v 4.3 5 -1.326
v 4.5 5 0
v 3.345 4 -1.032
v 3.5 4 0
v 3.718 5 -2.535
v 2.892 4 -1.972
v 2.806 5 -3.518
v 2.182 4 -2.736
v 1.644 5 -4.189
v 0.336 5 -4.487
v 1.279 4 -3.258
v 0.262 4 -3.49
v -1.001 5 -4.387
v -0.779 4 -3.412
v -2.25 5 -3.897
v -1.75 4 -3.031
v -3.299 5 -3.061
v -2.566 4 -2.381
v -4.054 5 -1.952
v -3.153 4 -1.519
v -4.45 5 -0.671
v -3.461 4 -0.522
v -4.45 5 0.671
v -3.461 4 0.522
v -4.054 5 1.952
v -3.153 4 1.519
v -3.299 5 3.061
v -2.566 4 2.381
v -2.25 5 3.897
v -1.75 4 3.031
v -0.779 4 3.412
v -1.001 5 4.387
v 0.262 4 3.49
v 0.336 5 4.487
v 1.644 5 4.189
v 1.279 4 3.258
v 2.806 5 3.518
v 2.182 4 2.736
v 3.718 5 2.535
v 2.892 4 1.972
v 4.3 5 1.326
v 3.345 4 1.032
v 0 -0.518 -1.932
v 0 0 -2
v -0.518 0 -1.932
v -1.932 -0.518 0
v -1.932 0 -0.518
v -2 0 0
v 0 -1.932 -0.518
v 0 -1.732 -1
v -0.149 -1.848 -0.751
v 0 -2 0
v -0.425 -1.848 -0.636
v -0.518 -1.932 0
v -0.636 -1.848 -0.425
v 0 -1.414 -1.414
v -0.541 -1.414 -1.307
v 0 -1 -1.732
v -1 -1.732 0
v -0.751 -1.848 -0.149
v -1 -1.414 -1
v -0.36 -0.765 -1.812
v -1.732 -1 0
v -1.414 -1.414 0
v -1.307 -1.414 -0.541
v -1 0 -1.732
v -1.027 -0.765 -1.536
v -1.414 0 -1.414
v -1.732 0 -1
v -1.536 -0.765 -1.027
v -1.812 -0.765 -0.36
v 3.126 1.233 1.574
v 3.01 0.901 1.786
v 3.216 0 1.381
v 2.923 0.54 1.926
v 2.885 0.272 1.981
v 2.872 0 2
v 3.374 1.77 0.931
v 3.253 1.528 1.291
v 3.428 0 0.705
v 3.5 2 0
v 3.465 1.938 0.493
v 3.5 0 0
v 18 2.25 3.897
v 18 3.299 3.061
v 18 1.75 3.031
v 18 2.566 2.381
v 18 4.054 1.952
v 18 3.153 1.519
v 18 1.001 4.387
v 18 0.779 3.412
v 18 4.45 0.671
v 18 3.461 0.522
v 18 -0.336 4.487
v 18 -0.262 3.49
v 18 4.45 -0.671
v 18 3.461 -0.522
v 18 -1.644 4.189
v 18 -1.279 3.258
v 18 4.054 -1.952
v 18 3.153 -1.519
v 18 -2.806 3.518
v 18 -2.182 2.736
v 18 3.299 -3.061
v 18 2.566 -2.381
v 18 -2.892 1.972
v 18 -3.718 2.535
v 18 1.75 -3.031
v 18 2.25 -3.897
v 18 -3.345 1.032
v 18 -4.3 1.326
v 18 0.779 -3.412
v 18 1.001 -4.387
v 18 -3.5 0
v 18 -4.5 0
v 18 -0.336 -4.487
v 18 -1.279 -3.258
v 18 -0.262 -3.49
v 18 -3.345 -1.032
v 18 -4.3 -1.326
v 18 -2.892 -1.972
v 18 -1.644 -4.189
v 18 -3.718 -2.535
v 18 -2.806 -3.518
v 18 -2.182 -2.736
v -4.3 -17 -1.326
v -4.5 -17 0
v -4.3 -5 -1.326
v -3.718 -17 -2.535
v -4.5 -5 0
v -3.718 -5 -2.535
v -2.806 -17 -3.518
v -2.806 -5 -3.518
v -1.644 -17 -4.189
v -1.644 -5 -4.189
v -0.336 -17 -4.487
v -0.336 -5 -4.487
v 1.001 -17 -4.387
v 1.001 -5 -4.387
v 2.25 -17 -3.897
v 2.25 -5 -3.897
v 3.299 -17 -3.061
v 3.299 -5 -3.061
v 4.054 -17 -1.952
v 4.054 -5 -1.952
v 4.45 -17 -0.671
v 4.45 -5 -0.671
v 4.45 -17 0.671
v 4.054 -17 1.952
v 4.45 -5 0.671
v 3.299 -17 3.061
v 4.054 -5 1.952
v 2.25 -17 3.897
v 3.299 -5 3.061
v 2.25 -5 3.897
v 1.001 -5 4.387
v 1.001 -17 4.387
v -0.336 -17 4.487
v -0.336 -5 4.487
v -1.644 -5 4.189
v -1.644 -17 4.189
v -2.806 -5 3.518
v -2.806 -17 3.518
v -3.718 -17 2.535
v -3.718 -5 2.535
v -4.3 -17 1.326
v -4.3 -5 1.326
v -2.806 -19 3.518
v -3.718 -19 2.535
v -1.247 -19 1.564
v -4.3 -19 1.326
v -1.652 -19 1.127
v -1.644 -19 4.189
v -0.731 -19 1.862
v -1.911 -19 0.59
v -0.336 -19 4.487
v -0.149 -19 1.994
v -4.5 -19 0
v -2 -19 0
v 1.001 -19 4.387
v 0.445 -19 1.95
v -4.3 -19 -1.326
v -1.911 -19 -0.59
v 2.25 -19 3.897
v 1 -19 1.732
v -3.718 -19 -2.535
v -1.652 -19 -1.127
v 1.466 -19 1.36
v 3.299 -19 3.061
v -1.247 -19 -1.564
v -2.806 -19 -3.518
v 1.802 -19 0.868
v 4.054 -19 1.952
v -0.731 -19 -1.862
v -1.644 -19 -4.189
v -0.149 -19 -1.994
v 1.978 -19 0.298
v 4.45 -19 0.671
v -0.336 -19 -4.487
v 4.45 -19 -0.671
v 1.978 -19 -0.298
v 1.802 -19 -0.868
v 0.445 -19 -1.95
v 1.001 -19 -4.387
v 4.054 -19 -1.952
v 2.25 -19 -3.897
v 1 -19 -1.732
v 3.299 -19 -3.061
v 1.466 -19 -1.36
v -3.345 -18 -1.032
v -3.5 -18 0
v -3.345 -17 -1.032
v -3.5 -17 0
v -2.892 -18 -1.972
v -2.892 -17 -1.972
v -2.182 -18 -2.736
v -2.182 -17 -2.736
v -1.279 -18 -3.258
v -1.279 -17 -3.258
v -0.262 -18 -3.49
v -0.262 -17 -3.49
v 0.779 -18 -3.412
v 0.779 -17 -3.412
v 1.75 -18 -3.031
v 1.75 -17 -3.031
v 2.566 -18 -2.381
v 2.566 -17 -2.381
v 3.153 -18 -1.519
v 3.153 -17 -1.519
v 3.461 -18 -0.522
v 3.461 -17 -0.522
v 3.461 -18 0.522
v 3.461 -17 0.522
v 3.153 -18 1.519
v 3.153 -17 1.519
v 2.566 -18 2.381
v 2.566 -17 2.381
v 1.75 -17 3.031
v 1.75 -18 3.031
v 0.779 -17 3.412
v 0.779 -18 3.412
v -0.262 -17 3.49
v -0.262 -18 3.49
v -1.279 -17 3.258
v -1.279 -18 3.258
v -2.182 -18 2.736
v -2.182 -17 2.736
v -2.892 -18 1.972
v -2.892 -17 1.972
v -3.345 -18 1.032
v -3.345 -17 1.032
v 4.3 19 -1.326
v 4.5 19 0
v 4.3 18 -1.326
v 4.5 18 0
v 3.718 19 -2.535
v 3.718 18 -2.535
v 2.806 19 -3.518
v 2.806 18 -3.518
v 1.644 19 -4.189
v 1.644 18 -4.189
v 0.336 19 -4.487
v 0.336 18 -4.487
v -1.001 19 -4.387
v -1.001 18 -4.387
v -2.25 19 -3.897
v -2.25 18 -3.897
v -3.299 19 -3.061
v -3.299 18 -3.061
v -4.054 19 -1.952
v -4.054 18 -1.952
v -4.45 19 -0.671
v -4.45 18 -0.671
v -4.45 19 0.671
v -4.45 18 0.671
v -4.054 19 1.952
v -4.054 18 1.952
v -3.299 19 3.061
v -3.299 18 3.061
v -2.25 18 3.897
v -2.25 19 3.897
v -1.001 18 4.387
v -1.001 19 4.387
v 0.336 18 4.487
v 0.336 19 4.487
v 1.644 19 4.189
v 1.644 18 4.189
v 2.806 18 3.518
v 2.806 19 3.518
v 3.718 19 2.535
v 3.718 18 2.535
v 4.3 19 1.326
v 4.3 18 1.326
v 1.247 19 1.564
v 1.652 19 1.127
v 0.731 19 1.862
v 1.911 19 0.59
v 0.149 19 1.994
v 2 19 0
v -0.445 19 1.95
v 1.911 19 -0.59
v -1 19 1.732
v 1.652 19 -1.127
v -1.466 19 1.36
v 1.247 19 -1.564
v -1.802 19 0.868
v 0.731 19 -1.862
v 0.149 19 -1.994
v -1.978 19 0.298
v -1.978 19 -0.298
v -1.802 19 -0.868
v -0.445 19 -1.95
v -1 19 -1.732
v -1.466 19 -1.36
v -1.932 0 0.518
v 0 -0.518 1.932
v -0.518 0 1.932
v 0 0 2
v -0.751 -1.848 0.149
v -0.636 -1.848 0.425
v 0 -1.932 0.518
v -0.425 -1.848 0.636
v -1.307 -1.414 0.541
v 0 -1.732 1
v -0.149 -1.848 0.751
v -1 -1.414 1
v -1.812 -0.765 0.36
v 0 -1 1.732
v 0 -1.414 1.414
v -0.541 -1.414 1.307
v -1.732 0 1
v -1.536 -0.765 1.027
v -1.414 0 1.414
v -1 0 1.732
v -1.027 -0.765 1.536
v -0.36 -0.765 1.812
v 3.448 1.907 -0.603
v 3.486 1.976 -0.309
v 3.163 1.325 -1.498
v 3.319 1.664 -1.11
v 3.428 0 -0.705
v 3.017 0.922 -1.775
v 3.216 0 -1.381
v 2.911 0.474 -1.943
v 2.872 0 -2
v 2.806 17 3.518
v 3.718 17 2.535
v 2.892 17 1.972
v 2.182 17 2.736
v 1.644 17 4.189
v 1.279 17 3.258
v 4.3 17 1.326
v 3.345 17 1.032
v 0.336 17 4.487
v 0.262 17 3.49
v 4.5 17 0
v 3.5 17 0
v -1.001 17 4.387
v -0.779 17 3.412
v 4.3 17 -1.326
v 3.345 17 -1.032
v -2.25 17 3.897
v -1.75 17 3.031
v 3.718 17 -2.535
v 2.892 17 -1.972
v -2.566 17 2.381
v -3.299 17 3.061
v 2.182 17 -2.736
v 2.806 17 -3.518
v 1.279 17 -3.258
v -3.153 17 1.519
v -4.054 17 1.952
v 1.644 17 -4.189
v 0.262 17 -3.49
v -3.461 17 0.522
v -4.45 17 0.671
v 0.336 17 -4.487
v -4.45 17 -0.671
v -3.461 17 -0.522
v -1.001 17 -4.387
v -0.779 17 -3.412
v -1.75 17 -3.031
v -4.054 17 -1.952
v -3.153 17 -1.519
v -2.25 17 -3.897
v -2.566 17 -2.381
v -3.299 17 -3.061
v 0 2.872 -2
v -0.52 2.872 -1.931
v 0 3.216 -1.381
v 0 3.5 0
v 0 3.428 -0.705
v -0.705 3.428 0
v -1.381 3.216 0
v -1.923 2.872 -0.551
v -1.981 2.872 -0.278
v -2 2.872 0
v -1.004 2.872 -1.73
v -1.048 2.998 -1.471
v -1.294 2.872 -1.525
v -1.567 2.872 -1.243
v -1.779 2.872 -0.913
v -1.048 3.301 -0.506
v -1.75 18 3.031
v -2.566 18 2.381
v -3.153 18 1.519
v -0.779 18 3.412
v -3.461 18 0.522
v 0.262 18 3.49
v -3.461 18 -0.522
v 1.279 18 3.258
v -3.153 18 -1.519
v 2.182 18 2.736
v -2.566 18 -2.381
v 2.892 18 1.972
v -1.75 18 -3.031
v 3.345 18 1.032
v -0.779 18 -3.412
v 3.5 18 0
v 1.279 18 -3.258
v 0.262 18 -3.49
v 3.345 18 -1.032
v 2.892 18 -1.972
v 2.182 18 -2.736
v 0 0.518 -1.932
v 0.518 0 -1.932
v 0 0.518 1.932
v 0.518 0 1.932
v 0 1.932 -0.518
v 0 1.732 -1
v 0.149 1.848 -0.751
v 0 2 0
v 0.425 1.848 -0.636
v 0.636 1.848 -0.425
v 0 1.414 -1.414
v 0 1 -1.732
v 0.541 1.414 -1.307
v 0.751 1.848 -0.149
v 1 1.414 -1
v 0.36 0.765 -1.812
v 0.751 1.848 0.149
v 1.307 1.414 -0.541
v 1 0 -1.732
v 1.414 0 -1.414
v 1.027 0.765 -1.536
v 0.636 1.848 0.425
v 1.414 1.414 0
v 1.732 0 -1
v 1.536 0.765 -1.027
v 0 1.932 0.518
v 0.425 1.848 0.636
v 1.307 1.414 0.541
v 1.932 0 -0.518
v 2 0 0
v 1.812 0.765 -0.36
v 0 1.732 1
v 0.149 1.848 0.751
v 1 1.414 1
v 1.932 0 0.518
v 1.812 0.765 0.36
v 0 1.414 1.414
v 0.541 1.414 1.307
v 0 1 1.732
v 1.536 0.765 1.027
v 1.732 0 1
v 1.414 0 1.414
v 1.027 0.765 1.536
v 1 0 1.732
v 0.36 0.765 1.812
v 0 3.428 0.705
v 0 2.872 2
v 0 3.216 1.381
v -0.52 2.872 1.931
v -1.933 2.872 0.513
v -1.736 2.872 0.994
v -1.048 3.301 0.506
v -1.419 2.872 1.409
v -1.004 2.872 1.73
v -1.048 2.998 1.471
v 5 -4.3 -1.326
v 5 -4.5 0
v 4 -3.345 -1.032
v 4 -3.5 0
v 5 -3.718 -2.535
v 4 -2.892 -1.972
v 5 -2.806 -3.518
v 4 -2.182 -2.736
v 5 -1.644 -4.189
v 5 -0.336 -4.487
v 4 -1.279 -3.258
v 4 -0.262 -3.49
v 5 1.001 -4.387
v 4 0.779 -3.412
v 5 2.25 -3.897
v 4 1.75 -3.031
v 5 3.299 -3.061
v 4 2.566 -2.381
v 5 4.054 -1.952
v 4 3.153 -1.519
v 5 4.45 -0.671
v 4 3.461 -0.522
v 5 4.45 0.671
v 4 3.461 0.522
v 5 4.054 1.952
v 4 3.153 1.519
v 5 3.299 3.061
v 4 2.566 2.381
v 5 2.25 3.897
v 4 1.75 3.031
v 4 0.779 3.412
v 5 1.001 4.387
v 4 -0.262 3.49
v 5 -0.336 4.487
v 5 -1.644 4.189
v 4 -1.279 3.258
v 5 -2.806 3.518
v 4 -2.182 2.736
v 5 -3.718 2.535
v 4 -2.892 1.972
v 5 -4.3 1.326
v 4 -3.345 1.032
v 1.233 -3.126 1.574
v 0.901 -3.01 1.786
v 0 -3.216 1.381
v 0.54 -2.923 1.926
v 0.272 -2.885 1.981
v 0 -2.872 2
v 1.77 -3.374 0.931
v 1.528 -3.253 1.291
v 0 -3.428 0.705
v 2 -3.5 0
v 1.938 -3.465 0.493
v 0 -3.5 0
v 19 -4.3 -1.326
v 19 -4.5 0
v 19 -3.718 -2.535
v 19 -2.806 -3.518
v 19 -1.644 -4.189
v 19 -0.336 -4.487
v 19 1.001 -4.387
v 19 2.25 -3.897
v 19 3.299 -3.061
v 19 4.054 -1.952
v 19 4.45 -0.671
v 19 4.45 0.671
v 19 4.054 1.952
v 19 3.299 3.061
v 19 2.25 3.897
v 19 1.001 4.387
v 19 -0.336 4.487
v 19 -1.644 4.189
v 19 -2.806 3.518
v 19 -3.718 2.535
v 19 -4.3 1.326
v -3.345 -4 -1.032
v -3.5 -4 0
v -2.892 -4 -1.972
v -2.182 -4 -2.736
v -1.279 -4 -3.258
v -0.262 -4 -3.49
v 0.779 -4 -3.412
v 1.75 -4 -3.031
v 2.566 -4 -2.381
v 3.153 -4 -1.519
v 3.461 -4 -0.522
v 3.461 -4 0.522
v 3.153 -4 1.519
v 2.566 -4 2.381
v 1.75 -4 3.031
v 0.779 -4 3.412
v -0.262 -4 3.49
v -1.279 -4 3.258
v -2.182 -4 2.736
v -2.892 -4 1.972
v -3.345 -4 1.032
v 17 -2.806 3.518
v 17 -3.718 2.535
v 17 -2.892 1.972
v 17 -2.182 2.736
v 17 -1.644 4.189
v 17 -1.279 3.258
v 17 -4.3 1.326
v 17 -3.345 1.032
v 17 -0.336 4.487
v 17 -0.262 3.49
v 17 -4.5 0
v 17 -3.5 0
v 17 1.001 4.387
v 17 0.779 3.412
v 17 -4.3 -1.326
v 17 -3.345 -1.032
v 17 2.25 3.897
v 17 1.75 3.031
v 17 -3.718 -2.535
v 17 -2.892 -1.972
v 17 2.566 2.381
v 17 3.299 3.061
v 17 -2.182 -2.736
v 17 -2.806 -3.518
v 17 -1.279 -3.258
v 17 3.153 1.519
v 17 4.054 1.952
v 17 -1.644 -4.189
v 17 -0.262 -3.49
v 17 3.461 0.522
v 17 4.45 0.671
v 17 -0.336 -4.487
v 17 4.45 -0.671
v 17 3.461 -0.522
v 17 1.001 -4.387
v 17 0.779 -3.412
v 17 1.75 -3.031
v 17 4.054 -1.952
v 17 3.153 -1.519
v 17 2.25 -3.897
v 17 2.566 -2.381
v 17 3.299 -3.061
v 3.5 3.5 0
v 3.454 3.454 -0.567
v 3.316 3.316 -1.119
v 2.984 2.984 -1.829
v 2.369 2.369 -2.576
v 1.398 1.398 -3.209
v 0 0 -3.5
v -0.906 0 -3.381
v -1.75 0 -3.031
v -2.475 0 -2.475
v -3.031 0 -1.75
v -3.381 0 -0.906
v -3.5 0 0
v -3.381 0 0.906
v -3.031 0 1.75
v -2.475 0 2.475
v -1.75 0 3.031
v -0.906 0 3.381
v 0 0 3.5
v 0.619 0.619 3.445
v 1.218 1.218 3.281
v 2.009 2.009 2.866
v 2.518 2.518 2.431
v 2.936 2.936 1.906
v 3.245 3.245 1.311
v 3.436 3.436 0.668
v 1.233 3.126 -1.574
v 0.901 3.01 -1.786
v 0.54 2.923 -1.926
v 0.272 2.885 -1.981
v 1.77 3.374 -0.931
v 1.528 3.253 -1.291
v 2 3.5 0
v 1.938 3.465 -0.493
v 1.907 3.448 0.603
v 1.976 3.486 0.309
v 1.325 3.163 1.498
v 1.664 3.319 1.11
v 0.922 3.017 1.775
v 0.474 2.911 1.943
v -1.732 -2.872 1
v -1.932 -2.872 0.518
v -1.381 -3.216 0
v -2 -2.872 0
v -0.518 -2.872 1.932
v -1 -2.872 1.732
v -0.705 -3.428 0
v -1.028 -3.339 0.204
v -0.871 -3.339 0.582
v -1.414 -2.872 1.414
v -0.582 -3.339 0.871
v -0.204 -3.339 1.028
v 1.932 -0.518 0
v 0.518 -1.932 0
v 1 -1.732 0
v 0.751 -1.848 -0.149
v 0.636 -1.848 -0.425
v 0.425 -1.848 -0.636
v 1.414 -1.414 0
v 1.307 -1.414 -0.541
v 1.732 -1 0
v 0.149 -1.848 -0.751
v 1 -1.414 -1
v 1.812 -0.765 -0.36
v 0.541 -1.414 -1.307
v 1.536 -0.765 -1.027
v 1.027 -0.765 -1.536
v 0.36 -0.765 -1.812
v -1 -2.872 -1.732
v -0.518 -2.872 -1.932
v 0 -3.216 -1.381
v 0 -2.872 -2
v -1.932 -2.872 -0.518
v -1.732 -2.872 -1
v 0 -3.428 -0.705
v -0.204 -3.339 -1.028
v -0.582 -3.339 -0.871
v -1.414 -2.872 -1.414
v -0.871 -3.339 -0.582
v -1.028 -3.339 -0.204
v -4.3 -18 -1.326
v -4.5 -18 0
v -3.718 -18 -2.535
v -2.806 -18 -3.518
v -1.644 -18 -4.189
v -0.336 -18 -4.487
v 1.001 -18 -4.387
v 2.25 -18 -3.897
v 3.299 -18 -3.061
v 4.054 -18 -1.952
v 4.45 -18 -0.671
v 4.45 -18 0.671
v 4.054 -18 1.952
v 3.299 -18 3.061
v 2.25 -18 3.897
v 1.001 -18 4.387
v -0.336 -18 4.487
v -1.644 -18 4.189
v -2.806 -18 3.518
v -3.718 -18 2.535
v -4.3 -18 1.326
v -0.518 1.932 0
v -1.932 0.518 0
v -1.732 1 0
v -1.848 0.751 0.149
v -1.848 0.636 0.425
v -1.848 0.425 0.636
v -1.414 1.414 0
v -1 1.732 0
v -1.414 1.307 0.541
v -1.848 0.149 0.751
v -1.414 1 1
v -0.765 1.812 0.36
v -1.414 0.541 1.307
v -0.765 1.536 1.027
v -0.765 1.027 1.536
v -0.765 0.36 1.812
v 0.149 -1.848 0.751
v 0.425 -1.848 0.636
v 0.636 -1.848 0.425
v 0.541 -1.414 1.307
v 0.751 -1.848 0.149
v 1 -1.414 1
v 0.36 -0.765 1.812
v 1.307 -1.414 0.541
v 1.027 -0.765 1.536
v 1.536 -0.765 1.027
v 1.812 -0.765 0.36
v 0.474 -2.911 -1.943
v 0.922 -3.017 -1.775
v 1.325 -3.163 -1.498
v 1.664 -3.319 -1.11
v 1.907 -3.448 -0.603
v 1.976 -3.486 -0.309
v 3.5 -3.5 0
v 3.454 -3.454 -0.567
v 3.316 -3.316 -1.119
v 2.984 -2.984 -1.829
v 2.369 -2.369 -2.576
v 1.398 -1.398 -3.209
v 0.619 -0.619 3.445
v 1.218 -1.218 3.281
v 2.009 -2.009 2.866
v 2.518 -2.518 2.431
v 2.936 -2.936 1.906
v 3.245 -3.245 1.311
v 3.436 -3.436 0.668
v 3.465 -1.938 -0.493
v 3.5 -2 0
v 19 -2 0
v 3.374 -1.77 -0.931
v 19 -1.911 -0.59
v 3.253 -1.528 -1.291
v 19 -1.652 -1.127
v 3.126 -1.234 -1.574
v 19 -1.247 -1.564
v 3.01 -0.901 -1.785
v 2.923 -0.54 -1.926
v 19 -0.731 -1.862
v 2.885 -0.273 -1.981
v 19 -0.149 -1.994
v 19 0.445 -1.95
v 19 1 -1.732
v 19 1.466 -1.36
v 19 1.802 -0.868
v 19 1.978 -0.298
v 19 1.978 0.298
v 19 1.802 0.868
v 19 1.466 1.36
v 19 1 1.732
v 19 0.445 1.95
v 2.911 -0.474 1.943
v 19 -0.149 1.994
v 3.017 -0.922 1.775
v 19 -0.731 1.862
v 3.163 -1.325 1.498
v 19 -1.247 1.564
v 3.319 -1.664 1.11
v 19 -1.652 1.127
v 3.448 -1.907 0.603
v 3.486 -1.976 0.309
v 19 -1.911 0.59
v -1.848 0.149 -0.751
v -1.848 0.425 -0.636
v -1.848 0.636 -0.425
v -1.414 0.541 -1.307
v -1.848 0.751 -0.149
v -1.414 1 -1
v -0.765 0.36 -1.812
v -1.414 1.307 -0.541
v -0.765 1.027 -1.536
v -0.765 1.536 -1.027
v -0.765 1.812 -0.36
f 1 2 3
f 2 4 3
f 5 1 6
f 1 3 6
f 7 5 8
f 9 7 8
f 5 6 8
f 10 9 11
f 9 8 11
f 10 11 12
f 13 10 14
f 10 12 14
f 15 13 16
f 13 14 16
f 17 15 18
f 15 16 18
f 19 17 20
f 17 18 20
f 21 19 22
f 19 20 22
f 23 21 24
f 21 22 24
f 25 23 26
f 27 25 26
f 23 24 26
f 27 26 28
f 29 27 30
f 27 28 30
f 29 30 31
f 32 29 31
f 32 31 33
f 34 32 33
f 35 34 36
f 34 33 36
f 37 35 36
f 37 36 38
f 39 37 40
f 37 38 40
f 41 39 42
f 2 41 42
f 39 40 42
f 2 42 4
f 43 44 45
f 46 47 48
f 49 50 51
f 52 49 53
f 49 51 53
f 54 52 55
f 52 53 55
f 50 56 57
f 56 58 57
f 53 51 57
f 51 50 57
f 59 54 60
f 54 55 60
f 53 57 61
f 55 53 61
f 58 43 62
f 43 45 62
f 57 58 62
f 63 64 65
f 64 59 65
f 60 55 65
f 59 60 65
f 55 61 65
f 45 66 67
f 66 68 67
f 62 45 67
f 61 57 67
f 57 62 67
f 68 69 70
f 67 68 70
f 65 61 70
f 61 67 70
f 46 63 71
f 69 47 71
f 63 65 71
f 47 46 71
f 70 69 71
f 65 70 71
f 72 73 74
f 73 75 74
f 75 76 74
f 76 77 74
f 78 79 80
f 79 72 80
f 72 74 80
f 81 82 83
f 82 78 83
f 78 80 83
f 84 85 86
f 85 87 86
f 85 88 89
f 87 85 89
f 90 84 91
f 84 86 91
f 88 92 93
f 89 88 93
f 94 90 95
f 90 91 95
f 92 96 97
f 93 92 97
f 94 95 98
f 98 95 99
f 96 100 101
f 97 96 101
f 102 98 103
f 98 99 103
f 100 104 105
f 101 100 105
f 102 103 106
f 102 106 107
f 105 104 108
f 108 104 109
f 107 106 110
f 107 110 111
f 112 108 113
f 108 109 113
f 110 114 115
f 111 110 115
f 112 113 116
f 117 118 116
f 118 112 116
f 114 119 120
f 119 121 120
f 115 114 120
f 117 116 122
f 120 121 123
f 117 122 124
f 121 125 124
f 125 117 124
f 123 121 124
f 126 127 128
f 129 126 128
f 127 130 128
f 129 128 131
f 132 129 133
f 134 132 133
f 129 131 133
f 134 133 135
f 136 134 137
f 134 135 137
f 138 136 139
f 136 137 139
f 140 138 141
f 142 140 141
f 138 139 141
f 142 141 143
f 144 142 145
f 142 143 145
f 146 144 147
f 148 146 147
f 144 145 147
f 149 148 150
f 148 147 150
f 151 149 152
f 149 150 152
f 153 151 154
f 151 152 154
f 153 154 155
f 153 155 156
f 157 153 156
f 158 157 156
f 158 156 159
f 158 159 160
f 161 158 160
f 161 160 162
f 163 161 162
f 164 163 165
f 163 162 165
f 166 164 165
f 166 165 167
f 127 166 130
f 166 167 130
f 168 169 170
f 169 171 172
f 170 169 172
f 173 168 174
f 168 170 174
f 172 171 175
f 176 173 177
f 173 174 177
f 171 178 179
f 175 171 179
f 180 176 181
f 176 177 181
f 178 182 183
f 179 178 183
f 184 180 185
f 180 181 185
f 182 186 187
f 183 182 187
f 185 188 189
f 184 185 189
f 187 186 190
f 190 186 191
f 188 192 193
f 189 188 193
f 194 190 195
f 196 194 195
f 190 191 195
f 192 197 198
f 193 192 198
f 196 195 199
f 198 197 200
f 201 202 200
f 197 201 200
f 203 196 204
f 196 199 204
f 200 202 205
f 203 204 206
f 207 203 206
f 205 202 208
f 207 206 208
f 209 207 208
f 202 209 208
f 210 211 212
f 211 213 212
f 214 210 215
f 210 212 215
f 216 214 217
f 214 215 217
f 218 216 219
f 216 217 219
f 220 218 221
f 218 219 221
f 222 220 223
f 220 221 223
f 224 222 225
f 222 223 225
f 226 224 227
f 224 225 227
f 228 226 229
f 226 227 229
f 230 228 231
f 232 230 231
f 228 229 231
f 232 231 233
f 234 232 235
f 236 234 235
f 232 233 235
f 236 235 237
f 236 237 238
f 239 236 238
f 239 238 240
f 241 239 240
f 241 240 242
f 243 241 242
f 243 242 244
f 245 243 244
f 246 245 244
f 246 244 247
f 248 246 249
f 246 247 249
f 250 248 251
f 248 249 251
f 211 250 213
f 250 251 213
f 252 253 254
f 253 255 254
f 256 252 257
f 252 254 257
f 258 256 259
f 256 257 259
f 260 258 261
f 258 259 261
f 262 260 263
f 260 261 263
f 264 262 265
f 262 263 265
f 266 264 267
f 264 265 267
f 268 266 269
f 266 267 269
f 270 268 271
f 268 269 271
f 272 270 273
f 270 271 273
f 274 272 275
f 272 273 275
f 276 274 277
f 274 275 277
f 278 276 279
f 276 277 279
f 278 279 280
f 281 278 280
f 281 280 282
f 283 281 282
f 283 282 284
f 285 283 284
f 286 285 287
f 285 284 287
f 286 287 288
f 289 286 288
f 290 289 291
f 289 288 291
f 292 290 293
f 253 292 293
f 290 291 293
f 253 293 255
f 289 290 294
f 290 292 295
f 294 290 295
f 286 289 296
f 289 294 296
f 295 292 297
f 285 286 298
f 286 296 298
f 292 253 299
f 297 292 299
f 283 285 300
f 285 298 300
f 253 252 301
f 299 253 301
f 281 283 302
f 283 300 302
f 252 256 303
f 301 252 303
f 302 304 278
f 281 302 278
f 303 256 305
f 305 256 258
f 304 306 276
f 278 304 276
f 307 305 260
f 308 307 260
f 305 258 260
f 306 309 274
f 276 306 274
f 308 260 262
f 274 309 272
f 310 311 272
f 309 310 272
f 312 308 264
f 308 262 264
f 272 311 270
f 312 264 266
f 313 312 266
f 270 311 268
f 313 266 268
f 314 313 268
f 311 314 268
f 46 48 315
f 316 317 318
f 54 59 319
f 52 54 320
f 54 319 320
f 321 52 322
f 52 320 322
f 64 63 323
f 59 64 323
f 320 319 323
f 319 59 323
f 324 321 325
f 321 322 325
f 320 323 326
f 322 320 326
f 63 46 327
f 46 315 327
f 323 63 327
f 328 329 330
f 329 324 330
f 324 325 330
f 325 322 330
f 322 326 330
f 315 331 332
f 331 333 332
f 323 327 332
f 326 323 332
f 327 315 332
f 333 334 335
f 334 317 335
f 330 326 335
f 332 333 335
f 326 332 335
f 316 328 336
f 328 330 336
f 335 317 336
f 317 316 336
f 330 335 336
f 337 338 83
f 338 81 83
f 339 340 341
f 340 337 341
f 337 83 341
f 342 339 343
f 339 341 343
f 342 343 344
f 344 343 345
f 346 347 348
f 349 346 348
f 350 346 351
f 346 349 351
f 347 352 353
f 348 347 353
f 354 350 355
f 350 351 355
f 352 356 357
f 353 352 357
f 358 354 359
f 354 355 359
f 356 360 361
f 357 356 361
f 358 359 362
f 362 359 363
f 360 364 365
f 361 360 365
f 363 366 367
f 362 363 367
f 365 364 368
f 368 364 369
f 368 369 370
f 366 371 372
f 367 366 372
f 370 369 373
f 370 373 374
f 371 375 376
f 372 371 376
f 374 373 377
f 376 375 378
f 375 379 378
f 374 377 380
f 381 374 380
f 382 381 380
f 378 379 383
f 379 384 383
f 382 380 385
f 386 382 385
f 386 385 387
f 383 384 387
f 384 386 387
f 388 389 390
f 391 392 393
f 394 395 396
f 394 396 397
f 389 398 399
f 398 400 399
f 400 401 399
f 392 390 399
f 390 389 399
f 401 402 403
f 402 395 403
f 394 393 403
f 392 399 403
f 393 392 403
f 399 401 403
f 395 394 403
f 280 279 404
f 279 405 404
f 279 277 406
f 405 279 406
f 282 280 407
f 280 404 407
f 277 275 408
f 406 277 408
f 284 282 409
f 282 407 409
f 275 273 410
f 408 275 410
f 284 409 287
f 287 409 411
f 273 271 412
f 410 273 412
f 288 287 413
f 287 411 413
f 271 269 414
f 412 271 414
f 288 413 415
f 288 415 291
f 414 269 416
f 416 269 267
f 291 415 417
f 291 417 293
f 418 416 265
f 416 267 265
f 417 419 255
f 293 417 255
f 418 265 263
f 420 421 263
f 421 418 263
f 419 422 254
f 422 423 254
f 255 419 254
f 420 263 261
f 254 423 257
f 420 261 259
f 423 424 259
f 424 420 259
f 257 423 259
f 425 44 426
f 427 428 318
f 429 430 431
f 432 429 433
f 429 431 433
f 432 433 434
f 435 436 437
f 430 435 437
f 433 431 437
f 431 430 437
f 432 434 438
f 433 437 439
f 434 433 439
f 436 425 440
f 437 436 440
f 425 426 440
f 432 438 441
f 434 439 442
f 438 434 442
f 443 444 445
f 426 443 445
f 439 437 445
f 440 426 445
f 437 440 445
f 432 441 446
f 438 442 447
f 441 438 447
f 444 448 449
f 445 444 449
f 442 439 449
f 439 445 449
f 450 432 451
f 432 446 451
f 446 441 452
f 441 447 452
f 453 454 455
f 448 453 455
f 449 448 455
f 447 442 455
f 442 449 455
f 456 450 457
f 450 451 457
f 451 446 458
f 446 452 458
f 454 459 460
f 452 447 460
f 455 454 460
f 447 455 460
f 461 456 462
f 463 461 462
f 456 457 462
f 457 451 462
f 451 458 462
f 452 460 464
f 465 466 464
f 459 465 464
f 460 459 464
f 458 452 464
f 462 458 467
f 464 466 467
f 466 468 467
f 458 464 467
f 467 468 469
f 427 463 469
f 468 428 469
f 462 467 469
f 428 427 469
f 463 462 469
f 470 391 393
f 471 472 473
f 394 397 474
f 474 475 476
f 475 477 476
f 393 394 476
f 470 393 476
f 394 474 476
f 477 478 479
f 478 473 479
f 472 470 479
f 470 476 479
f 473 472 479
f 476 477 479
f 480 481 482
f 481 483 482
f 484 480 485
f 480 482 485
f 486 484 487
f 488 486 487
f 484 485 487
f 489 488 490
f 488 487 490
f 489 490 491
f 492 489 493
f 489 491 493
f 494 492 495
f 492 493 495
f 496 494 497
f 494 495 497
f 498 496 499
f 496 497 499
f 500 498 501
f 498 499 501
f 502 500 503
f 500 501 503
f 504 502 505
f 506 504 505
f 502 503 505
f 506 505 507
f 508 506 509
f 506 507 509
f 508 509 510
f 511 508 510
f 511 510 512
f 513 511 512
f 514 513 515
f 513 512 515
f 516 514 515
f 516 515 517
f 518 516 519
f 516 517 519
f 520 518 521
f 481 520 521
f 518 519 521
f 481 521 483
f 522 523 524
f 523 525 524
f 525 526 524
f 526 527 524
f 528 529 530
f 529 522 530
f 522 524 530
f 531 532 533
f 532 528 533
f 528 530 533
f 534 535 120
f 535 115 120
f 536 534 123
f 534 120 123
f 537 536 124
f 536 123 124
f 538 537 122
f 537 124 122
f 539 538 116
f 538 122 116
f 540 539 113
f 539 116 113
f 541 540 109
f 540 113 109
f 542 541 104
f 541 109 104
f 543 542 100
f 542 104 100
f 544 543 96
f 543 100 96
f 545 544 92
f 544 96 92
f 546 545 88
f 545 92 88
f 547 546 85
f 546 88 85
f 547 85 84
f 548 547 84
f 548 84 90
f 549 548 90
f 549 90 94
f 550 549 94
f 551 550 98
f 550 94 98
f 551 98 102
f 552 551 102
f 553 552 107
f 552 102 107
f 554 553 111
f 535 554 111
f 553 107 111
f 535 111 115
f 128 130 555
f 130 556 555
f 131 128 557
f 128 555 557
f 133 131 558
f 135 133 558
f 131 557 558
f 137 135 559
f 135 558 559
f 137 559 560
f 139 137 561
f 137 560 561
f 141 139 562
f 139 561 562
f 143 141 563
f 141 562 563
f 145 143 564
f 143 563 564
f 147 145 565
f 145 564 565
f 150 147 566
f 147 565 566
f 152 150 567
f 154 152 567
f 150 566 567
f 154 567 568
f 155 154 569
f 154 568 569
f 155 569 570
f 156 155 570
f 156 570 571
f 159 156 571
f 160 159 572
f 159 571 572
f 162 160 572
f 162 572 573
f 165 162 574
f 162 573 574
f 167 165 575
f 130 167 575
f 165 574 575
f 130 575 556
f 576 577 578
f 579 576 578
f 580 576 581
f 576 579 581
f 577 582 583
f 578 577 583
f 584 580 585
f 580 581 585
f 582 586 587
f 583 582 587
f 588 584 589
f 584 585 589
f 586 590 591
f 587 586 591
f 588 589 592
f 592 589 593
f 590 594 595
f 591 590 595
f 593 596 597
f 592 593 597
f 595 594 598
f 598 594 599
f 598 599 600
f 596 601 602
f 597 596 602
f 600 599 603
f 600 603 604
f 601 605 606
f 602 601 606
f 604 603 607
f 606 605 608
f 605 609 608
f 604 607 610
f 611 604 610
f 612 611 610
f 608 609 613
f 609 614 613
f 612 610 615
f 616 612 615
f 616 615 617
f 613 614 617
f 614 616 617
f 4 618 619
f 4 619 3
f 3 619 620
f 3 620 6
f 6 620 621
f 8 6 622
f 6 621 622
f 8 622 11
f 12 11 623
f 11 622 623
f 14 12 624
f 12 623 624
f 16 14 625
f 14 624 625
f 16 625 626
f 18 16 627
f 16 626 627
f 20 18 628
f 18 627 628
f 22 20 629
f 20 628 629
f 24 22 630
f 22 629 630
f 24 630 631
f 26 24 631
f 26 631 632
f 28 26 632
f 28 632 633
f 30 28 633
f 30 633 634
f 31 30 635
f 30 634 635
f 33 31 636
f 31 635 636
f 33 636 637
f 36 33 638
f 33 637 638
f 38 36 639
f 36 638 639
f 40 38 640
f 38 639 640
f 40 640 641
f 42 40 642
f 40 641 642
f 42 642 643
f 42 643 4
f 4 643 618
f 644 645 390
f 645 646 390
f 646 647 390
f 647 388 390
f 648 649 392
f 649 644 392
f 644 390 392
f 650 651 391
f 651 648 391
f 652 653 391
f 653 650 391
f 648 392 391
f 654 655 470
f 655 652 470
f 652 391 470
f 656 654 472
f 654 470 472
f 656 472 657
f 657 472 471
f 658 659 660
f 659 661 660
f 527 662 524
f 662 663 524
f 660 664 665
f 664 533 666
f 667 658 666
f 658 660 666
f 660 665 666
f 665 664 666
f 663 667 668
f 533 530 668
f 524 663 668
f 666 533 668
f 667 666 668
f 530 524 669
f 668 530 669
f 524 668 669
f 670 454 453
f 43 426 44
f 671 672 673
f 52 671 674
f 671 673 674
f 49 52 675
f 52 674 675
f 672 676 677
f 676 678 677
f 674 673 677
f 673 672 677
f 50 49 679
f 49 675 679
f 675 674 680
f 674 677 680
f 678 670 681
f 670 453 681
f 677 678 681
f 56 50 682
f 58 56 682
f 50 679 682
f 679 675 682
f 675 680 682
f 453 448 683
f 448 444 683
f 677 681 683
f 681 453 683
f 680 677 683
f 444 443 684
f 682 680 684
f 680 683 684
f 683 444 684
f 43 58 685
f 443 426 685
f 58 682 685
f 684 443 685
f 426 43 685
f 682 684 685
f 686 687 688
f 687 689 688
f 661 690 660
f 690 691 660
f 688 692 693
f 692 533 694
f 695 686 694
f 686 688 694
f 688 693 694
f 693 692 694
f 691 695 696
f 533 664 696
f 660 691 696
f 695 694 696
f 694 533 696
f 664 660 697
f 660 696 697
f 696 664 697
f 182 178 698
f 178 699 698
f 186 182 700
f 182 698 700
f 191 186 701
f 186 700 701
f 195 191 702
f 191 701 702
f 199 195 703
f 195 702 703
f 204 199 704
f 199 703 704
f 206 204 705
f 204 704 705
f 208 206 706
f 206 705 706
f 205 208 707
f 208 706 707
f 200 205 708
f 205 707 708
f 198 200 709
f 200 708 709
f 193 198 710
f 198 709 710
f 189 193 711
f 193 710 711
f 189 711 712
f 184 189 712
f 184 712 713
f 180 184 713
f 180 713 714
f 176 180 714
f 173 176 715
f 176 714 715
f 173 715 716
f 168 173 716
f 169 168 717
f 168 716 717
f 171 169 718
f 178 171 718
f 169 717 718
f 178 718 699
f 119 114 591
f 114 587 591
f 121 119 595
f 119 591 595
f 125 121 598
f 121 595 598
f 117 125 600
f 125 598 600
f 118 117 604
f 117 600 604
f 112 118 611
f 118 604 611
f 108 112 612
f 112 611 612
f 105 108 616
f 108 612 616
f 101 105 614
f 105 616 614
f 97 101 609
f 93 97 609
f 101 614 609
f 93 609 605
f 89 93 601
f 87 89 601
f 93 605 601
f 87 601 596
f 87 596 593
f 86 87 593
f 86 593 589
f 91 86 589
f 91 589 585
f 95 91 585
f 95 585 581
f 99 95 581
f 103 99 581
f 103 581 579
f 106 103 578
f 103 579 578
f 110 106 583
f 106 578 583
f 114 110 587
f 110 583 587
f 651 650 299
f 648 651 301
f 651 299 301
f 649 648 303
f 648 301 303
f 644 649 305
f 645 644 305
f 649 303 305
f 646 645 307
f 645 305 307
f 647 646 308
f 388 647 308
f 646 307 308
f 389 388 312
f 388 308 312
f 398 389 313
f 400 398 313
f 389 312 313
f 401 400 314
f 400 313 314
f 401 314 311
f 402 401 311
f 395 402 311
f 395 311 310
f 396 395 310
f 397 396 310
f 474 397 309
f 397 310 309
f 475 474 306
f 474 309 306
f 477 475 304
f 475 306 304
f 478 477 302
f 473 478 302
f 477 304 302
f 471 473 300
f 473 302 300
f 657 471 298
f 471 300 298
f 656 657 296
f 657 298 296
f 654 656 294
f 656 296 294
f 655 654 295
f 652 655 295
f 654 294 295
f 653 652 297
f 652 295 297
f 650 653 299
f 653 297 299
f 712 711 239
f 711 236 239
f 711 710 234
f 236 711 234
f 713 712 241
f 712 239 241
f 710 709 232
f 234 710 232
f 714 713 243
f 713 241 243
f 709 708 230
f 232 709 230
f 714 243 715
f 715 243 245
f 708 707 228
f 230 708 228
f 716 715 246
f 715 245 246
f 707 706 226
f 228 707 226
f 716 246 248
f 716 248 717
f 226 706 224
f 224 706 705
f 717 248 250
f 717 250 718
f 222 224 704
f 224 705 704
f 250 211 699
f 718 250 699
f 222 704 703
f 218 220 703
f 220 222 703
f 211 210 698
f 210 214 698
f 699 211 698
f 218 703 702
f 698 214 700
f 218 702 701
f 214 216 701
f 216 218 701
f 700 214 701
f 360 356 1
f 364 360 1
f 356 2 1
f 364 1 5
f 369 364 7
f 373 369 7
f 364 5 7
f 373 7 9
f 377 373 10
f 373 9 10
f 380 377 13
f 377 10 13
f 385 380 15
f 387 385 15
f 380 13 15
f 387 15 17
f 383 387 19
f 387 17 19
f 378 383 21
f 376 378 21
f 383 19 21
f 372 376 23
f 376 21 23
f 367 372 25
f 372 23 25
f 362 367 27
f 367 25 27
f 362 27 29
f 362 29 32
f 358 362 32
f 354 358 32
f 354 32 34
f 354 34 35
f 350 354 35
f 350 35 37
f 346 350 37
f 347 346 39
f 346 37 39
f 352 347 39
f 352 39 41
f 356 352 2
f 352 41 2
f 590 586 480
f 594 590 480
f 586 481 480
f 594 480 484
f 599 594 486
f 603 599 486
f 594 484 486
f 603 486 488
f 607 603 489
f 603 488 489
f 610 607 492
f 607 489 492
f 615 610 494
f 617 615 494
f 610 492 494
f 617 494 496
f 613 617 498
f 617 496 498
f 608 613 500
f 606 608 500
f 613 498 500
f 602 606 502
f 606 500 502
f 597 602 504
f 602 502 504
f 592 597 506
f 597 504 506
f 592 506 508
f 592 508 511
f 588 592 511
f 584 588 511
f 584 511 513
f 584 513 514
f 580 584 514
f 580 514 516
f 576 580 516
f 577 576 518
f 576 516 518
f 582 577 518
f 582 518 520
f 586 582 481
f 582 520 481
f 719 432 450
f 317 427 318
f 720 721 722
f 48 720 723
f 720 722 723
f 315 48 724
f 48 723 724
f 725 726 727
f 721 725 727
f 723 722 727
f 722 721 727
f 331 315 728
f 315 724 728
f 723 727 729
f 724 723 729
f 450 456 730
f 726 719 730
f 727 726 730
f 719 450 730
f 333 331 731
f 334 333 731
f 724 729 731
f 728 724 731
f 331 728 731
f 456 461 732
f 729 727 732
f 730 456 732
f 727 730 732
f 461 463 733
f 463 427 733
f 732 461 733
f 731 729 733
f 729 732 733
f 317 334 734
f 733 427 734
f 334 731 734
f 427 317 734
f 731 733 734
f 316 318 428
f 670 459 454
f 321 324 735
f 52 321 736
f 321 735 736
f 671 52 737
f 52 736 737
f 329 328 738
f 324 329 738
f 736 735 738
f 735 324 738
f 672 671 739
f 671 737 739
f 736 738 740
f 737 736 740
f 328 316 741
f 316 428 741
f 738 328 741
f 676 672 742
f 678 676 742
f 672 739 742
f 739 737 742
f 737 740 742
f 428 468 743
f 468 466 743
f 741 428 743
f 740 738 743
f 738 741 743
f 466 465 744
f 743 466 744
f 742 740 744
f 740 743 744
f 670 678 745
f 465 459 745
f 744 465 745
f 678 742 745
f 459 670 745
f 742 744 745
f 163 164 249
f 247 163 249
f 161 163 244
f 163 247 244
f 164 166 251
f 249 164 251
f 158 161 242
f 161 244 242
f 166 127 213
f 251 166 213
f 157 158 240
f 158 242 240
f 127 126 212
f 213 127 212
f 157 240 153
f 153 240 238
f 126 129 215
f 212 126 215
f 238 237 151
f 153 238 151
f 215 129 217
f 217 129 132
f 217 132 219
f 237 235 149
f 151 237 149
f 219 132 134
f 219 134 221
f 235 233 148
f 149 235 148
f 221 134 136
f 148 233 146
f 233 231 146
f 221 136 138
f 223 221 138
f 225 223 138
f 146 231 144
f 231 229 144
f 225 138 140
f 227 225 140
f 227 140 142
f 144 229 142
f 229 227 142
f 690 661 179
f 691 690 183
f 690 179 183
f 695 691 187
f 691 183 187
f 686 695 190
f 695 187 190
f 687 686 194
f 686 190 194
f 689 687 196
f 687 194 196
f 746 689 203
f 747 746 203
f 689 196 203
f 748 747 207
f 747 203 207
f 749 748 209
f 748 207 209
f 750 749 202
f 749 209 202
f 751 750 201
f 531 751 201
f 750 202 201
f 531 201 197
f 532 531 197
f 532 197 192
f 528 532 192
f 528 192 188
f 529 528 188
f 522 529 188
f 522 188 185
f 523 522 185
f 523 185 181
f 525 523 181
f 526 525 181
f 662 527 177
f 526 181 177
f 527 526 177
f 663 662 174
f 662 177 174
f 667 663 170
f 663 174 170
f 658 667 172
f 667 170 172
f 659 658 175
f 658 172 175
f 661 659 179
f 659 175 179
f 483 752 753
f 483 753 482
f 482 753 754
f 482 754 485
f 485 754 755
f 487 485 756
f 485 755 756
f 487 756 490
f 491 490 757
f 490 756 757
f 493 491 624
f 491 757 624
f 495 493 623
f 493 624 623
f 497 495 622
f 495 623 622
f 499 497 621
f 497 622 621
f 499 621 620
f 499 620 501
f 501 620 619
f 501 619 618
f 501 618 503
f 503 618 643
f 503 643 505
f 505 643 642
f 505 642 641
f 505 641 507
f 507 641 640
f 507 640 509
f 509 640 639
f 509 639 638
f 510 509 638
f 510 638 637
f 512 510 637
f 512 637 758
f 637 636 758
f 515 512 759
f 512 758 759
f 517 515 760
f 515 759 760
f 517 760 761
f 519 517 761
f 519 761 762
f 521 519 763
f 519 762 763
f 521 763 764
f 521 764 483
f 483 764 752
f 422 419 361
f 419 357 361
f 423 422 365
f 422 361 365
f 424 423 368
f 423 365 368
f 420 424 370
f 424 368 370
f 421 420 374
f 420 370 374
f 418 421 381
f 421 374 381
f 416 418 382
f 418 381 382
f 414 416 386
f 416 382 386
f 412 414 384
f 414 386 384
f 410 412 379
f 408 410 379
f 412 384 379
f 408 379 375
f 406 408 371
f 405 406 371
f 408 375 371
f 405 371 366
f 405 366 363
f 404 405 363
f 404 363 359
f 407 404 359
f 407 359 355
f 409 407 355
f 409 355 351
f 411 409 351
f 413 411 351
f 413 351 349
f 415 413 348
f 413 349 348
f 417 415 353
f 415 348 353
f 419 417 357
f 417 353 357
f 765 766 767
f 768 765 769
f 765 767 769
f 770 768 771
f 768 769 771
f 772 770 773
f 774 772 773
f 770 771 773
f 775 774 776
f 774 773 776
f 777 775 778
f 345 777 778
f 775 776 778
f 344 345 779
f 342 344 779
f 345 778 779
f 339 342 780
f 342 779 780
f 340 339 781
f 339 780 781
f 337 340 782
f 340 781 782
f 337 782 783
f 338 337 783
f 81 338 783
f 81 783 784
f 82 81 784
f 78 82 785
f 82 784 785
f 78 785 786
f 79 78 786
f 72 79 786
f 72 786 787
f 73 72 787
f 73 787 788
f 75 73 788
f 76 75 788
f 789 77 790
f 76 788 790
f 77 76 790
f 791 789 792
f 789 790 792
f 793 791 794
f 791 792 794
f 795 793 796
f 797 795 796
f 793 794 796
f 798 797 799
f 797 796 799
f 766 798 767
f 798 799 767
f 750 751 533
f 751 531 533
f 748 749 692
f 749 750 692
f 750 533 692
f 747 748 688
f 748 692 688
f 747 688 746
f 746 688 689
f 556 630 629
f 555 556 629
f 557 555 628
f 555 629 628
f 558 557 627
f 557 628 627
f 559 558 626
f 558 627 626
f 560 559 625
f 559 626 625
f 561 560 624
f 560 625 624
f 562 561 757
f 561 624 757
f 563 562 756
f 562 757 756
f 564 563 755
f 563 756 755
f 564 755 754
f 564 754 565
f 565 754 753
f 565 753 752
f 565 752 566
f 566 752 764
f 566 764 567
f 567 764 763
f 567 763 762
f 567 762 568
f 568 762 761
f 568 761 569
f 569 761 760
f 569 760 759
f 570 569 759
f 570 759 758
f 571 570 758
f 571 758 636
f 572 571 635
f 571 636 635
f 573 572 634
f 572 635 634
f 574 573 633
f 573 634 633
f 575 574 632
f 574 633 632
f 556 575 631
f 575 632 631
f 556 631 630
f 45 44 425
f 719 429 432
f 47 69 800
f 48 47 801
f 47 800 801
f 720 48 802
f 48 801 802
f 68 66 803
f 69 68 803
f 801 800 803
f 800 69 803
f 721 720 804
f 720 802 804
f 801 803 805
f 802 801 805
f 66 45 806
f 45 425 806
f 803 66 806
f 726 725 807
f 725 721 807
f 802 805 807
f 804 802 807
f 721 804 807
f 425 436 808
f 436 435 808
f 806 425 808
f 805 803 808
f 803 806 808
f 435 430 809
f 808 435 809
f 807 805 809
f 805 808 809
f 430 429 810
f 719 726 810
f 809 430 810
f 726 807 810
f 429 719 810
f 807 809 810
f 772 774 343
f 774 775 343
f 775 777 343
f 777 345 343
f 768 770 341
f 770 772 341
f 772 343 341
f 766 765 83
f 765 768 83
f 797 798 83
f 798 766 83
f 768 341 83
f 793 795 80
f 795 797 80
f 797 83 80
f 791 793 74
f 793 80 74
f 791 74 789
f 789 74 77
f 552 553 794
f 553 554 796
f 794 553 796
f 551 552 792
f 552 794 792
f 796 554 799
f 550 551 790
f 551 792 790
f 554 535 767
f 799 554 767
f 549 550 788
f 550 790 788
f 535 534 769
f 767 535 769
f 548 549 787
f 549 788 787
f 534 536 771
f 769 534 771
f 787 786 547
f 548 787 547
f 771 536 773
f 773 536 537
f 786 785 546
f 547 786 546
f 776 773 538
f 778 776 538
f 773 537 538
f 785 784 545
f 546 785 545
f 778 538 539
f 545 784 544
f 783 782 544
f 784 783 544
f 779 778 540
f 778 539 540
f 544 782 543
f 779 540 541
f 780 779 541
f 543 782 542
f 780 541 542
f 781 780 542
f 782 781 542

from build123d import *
from build123d.topology import SkipClean

# Parameters (mm, degrees)
PATTERN_CIRCULAR_1_COUNT = 3
PATTERN_CIRCULAR_1_ANGLE = 180


with BuildPart() as part:
    # Эскиз1 one side → Повернуть1 (revolve)
    with BuildSketch(Plane.XY, mode=Mode.PRIVATE) as revolve_1_sk:
        with BuildLine():
            Line((0, -3.5), (0, -2))
            ThreePointArc((0, -2), (-1.414213562, -1.414213562), (-2, 0))
            Line((-2, 0), (-2, 6))
            Line((-2, 6), (-2, 19))
            Line((-2, 19), (-4.5, 19))
            Line((-4.5, 19), (-4.5, 18))
            Line((-4.5, 18), (-3.5, 18))
            Line((-3.5, 18), (-3.5, 17))
            Line((-3.5, 17), (-4.5, 17))
            Line((-4.5, 17), (-4.5, 5))
            Line((-4.5, 5), (-3.5, 4))
            Line((-3.5, 4), (-3.5, 0))
            ThreePointArc((-3.5, 0), (-2.474873734, -2.474873734), (0, -3.5))
        make_face()
    revolve_1 = revolve(revolve_1_sk.sketch.rotate(Axis((0, 0.887308405, 0), (0, 1, 0)), 180), axis=Axis((0, 0.887308405, 0), (0, 1, 0)))

    # Круговой массив1: Повернуть1 ×3 about axis
    with SkipClean():  # the faces are left unmerged after this step: merging them gives an invalid solid
        pattern_circular_1_axis = Axis((0, 0, 0), (0, 0, -1))
        for i in range(1, PATTERN_CIRCULAR_1_COUNT):
            add(revolve_1.rotate(pattern_circular_1_axis, i * PATTERN_CIRCULAR_1_ANGLE / (PATTERN_CIRCULAR_1_COUNT - 1)))


solid = part.part
